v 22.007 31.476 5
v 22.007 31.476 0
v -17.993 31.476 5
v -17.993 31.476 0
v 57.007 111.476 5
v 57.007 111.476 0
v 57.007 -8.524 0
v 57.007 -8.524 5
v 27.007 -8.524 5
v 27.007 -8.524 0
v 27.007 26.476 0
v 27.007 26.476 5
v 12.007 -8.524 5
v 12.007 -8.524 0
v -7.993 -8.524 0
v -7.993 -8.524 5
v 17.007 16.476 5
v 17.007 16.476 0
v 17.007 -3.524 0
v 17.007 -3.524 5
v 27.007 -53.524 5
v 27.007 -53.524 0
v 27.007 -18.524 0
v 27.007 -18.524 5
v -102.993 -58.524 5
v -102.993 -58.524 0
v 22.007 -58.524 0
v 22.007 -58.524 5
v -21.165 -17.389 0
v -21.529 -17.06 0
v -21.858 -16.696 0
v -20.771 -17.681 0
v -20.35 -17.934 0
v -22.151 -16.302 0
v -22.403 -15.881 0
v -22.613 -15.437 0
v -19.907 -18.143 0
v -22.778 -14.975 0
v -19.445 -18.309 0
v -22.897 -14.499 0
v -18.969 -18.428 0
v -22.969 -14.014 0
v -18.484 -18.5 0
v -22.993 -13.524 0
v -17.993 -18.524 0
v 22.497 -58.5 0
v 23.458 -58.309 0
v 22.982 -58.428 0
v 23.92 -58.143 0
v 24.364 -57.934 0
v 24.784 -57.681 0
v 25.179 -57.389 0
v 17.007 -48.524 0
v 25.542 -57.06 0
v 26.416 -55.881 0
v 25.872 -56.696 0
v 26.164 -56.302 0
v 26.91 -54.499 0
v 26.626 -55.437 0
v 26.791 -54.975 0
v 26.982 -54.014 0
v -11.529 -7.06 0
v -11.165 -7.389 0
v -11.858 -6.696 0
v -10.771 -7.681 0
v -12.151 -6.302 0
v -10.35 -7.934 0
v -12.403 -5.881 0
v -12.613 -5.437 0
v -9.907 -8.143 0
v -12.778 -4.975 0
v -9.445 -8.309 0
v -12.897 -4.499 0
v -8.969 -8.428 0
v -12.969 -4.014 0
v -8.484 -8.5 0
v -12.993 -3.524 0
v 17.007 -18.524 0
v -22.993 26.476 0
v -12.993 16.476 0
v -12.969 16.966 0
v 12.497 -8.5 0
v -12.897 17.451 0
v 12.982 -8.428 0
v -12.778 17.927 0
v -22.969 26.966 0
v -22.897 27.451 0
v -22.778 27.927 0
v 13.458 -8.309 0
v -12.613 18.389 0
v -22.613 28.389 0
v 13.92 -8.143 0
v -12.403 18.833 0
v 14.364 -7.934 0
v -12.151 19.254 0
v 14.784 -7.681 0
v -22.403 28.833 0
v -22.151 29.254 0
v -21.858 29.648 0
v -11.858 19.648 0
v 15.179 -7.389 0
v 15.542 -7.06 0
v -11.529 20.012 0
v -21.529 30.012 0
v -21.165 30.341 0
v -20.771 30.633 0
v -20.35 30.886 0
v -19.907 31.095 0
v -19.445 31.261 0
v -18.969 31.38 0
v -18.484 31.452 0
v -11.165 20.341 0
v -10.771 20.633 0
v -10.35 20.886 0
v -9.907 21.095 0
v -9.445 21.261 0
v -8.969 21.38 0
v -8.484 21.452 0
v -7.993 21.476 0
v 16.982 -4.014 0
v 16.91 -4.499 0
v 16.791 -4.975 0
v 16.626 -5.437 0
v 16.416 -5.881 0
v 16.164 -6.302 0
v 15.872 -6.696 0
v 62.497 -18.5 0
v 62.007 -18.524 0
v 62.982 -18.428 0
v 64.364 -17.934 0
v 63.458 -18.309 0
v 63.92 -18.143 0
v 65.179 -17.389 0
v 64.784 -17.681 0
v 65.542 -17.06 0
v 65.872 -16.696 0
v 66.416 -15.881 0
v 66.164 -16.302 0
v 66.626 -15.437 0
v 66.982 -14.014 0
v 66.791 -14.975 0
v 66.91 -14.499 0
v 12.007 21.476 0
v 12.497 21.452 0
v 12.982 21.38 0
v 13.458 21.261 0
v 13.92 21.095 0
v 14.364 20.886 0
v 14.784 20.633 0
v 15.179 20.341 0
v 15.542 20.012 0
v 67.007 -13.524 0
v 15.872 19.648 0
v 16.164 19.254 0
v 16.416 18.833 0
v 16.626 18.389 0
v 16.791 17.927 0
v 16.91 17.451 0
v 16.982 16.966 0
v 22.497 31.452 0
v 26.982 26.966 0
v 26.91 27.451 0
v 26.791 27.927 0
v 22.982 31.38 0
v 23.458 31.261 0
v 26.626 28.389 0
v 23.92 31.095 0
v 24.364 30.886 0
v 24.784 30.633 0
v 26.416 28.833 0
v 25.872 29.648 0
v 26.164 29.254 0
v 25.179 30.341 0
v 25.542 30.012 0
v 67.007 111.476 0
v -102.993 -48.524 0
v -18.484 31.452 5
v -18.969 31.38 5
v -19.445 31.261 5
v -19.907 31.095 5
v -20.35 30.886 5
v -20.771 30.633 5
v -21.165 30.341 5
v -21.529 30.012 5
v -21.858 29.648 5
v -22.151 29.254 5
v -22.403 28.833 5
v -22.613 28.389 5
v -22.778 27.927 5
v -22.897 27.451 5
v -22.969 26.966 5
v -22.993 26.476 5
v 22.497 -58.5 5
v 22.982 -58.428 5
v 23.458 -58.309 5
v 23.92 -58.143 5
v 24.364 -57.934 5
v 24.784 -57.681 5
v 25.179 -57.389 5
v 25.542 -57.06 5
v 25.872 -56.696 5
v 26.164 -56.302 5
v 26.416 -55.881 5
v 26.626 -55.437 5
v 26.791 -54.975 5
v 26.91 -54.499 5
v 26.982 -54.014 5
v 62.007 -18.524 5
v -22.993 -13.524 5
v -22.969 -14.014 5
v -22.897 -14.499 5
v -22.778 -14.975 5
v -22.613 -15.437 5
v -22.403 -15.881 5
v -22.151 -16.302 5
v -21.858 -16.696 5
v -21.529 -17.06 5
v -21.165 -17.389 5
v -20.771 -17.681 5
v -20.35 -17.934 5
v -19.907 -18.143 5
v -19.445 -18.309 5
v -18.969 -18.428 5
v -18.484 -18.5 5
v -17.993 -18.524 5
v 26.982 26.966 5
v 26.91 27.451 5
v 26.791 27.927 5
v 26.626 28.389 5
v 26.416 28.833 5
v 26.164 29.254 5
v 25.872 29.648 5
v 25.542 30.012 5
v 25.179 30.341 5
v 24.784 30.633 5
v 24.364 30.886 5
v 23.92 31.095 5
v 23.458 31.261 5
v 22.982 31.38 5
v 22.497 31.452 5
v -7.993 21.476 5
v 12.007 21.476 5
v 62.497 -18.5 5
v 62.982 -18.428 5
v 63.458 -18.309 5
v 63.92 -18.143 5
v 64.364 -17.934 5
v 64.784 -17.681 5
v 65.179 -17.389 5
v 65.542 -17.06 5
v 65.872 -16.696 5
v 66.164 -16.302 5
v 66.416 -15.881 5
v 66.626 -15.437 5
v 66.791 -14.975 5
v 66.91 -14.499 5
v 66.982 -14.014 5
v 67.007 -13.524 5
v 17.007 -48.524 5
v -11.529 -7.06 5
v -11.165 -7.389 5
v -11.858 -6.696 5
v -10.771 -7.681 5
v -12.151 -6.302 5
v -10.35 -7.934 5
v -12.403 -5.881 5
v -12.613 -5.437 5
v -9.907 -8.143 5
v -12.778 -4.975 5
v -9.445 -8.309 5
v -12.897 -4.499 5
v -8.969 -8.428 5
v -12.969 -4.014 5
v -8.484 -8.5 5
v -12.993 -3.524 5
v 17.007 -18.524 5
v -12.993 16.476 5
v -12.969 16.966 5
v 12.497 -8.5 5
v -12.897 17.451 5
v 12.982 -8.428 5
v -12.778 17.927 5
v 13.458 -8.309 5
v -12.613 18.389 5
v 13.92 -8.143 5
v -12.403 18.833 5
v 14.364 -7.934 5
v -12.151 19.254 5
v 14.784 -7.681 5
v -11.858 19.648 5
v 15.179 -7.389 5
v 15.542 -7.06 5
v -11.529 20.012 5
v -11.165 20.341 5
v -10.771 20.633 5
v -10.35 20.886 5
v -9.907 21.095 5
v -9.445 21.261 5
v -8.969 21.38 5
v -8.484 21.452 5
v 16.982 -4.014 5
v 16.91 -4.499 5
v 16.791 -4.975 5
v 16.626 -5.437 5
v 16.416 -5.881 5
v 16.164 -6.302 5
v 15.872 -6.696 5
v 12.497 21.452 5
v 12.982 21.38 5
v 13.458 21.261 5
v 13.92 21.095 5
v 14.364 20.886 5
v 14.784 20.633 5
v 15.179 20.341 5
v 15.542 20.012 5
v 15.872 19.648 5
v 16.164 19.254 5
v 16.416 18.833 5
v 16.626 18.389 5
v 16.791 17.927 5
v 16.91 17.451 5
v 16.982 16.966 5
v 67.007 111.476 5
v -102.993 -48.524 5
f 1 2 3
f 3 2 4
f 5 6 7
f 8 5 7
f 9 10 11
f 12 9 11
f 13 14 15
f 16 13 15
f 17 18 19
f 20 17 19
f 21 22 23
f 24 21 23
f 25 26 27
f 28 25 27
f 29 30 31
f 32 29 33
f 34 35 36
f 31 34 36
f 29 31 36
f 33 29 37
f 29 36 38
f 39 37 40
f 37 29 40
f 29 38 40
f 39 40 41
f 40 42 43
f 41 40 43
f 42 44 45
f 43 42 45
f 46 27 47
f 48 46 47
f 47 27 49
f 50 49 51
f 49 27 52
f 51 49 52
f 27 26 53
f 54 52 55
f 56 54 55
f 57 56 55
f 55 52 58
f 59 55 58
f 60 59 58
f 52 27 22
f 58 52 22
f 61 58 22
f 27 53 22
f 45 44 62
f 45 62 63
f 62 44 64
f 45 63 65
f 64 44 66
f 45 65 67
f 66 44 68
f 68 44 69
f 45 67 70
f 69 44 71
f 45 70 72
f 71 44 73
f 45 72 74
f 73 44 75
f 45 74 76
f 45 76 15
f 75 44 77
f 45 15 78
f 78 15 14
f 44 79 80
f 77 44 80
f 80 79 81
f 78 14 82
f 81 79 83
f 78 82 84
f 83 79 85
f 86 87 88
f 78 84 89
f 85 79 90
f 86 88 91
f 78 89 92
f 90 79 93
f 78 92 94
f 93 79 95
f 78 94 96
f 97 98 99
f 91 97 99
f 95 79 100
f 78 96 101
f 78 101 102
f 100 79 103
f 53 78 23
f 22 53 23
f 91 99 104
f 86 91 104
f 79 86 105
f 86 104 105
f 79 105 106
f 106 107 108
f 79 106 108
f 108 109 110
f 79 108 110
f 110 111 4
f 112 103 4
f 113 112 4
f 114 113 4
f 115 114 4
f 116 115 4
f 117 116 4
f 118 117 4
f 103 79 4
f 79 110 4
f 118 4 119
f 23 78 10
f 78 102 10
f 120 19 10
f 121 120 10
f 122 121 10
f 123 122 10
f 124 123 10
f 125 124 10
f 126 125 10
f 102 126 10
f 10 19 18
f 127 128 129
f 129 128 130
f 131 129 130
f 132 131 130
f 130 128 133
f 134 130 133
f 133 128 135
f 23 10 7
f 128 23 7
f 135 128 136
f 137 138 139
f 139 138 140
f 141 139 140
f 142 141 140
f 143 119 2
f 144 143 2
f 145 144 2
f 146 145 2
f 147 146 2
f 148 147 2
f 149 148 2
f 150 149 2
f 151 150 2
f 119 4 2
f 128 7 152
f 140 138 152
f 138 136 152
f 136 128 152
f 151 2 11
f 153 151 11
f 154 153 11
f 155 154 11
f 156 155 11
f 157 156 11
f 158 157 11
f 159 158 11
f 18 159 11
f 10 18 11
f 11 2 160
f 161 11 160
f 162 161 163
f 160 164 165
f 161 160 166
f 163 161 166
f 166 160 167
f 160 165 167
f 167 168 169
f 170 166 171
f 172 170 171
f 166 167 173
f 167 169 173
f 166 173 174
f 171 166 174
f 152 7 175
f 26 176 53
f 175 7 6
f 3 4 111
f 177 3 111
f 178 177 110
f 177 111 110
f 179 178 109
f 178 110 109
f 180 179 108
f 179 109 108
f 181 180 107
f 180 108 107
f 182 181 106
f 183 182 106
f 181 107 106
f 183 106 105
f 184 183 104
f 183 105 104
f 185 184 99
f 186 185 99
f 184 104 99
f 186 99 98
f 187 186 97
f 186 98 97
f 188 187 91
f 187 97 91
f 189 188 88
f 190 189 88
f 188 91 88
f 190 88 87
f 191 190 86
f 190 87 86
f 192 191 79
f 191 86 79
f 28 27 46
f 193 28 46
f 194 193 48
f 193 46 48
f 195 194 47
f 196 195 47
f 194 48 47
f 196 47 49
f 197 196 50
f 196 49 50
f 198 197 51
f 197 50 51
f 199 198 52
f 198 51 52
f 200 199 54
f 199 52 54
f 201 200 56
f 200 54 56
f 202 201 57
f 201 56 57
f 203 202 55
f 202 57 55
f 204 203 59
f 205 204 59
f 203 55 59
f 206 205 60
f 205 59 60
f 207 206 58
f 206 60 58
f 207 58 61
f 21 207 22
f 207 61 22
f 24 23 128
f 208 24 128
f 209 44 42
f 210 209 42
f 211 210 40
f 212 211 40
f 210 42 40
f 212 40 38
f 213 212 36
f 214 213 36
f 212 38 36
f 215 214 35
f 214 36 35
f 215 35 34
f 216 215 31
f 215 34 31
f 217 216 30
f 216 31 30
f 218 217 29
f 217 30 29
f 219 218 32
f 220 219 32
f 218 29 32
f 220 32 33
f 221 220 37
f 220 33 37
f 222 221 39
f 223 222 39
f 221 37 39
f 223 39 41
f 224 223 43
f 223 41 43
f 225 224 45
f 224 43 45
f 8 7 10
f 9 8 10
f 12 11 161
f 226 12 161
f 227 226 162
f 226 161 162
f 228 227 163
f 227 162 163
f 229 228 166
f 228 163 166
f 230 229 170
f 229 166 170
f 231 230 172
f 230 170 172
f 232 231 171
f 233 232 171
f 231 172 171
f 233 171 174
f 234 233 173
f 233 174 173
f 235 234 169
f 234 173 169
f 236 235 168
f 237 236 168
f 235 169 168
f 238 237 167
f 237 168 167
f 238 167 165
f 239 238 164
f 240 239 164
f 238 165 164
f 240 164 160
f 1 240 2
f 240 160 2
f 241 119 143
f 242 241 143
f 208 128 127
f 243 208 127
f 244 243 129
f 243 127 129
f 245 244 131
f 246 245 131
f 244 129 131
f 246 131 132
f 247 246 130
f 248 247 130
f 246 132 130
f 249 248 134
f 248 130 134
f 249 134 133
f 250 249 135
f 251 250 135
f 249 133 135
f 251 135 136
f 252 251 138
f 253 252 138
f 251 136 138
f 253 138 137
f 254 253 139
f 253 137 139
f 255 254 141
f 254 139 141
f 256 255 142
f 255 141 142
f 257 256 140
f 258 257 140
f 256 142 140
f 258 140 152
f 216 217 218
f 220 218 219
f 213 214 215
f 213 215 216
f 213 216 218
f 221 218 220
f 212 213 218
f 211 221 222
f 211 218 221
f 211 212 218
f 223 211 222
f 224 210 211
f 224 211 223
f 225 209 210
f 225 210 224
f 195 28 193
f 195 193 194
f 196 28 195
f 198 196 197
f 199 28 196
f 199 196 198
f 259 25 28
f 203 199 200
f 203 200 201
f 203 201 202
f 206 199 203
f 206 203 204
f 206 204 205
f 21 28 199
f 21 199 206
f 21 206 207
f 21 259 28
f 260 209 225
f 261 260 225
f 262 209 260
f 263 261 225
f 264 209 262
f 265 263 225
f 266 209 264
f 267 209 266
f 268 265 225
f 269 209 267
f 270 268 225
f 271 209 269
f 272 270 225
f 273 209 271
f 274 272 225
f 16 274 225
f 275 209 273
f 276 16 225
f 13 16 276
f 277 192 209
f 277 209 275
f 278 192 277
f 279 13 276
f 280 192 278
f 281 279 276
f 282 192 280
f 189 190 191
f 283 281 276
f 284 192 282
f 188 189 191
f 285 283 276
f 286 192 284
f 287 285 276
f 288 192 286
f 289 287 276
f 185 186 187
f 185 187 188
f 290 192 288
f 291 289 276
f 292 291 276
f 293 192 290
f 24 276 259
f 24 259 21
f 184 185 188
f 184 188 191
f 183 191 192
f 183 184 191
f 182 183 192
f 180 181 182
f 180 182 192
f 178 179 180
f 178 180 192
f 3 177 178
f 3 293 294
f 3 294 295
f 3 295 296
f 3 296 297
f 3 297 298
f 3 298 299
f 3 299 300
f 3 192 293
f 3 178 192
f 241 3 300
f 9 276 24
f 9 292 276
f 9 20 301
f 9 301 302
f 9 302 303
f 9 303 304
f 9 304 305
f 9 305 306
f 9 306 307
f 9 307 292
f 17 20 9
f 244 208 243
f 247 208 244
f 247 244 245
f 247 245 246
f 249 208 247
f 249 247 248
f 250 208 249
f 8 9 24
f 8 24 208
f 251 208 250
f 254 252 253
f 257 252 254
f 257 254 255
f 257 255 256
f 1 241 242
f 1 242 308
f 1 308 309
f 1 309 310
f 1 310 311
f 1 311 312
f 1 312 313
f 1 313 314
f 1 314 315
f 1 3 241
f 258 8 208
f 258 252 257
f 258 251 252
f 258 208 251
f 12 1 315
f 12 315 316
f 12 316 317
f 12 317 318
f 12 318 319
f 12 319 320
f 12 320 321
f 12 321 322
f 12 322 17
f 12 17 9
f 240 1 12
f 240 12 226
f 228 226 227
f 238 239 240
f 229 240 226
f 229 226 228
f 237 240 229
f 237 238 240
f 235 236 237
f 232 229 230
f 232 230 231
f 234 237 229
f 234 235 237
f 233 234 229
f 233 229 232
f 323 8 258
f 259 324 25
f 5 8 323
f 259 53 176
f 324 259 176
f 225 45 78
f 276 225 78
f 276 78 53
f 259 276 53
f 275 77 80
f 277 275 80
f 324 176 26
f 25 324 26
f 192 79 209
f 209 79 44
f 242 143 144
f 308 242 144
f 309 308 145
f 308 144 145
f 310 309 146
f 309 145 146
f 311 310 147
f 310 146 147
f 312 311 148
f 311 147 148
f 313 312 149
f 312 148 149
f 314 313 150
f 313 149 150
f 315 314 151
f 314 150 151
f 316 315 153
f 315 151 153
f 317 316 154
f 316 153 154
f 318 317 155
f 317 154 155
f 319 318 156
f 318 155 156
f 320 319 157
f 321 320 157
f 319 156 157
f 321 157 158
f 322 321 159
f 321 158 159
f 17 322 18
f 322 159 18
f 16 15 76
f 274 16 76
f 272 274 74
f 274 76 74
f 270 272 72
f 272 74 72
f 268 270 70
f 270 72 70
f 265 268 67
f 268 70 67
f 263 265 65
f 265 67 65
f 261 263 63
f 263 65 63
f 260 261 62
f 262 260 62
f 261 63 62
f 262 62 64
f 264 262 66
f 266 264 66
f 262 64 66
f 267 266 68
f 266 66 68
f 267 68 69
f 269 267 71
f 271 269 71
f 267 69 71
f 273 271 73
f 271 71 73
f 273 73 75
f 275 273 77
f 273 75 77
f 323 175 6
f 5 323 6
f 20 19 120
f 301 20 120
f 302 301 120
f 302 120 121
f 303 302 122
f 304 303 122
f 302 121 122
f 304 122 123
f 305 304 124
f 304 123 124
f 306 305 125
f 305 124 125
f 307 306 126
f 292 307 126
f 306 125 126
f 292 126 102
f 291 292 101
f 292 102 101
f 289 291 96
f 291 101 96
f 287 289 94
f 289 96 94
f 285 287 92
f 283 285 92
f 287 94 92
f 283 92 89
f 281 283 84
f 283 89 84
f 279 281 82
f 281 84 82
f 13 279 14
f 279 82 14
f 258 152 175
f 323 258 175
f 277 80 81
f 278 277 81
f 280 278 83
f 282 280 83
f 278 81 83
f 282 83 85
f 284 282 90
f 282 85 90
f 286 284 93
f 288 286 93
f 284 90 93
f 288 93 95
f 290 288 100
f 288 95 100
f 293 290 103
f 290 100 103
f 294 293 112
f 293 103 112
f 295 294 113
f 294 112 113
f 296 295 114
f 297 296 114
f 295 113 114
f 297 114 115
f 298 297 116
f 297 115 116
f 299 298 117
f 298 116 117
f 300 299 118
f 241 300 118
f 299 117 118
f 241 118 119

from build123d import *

# Parameters (mm, degrees)
F1_DEPTH = 5


with BuildPart() as f1:
    # F0 (on Top) → F1 (new body)
    with BuildSketch(Plane.XY):
        with BuildLine():
            Line((22.006568, 31.475988), (-17.993432, 31.475988))
            ThreePointArc((-17.993432, 31.475988), (-21.528966, 30.011522), (-22.993432, 26.475988))
            Line((-22.993432, 26.475988), (-22.993432, -13.524012))
            ThreePointArc((-22.993432, -13.524012), (-21.528966, -17.059546), (-17.993432, -18.524012))
            Line((-17.993432, -18.524012), (17.006568, -18.524012))
            Line((17.006568, -18.524012), (27.006568, -18.524012))
            Line((27.006568, -18.524012), (27.006568, -8.524012))
            Line((27.006568, -8.524012), (27.006568, 26.475988))
            ThreePointArc((27.006568, 26.475988), (25.542101, 30.011522), (22.006568, 31.475988))
        make_face()
        with BuildLine():
            ThreePointArc((-12.993432, 16.475988), (-11.528966, 20.011522), (-7.993432, 21.475988))
            Line((-7.993432, 21.475988), (12.006568, 21.475988))
            ThreePointArc((12.006568, 21.475988), (15.542101, 20.011522), (17.006568, 16.475988))
            Line((17.006568, 16.475988), (17.006568, -3.524012))
            ThreePointArc((17.006568, -3.524012), (15.542101, -7.059546), (12.006568, -8.524012))
            Line((12.006568, -8.524012), (-7.993432, -8.524012))
            ThreePointArc((-7.993432, -8.524012), (-11.528966, -7.059546), (-12.993432, -3.524012))
            Line((-12.993432, -3.524012), (-12.993432, 16.475988))
        make_face(mode=Mode.SUBTRACT)
        with BuildLine():
            Line((57.006568, -8.524012), (27.006568, -8.524012))
            Line((27.006568, -8.524012), (27.006568, -18.524012))
            Line((27.006568, -18.524012), (62.006568, -18.524012))
            ThreePointArc((62.006568, -18.524012), (65.542101, -17.059546), (67.006568, -13.524012))
            Line((67.006568, -13.524012), (67.006568, 111.475988))
            Line((67.006568, 111.475988), (57.006568, 111.475988))
            Line((57.006568, 111.475988), (57.006568, -8.524012))
        make_face()
        with BuildLine():
            Line((27.006568, -53.524012), (27.006568, -18.524012))
            Line((27.006568, -18.524012), (17.006568, -18.524012))
            Line((17.006568, -18.524012), (17.006568, -48.524012))
            Line((17.006568, -48.524012), (-102.993432, -48.524012))
            Line((-102.993432, -48.524012), (-102.993432, -58.524012))
            Line((-102.993432, -58.524012), (22.006568, -58.524012))
            ThreePointArc((22.006568, -58.524012), (25.542101, -57.059546), (27.006568, -53.524012))
        make_face()
    extrude(amount=F1_DEPTH)


solid = f1.part
